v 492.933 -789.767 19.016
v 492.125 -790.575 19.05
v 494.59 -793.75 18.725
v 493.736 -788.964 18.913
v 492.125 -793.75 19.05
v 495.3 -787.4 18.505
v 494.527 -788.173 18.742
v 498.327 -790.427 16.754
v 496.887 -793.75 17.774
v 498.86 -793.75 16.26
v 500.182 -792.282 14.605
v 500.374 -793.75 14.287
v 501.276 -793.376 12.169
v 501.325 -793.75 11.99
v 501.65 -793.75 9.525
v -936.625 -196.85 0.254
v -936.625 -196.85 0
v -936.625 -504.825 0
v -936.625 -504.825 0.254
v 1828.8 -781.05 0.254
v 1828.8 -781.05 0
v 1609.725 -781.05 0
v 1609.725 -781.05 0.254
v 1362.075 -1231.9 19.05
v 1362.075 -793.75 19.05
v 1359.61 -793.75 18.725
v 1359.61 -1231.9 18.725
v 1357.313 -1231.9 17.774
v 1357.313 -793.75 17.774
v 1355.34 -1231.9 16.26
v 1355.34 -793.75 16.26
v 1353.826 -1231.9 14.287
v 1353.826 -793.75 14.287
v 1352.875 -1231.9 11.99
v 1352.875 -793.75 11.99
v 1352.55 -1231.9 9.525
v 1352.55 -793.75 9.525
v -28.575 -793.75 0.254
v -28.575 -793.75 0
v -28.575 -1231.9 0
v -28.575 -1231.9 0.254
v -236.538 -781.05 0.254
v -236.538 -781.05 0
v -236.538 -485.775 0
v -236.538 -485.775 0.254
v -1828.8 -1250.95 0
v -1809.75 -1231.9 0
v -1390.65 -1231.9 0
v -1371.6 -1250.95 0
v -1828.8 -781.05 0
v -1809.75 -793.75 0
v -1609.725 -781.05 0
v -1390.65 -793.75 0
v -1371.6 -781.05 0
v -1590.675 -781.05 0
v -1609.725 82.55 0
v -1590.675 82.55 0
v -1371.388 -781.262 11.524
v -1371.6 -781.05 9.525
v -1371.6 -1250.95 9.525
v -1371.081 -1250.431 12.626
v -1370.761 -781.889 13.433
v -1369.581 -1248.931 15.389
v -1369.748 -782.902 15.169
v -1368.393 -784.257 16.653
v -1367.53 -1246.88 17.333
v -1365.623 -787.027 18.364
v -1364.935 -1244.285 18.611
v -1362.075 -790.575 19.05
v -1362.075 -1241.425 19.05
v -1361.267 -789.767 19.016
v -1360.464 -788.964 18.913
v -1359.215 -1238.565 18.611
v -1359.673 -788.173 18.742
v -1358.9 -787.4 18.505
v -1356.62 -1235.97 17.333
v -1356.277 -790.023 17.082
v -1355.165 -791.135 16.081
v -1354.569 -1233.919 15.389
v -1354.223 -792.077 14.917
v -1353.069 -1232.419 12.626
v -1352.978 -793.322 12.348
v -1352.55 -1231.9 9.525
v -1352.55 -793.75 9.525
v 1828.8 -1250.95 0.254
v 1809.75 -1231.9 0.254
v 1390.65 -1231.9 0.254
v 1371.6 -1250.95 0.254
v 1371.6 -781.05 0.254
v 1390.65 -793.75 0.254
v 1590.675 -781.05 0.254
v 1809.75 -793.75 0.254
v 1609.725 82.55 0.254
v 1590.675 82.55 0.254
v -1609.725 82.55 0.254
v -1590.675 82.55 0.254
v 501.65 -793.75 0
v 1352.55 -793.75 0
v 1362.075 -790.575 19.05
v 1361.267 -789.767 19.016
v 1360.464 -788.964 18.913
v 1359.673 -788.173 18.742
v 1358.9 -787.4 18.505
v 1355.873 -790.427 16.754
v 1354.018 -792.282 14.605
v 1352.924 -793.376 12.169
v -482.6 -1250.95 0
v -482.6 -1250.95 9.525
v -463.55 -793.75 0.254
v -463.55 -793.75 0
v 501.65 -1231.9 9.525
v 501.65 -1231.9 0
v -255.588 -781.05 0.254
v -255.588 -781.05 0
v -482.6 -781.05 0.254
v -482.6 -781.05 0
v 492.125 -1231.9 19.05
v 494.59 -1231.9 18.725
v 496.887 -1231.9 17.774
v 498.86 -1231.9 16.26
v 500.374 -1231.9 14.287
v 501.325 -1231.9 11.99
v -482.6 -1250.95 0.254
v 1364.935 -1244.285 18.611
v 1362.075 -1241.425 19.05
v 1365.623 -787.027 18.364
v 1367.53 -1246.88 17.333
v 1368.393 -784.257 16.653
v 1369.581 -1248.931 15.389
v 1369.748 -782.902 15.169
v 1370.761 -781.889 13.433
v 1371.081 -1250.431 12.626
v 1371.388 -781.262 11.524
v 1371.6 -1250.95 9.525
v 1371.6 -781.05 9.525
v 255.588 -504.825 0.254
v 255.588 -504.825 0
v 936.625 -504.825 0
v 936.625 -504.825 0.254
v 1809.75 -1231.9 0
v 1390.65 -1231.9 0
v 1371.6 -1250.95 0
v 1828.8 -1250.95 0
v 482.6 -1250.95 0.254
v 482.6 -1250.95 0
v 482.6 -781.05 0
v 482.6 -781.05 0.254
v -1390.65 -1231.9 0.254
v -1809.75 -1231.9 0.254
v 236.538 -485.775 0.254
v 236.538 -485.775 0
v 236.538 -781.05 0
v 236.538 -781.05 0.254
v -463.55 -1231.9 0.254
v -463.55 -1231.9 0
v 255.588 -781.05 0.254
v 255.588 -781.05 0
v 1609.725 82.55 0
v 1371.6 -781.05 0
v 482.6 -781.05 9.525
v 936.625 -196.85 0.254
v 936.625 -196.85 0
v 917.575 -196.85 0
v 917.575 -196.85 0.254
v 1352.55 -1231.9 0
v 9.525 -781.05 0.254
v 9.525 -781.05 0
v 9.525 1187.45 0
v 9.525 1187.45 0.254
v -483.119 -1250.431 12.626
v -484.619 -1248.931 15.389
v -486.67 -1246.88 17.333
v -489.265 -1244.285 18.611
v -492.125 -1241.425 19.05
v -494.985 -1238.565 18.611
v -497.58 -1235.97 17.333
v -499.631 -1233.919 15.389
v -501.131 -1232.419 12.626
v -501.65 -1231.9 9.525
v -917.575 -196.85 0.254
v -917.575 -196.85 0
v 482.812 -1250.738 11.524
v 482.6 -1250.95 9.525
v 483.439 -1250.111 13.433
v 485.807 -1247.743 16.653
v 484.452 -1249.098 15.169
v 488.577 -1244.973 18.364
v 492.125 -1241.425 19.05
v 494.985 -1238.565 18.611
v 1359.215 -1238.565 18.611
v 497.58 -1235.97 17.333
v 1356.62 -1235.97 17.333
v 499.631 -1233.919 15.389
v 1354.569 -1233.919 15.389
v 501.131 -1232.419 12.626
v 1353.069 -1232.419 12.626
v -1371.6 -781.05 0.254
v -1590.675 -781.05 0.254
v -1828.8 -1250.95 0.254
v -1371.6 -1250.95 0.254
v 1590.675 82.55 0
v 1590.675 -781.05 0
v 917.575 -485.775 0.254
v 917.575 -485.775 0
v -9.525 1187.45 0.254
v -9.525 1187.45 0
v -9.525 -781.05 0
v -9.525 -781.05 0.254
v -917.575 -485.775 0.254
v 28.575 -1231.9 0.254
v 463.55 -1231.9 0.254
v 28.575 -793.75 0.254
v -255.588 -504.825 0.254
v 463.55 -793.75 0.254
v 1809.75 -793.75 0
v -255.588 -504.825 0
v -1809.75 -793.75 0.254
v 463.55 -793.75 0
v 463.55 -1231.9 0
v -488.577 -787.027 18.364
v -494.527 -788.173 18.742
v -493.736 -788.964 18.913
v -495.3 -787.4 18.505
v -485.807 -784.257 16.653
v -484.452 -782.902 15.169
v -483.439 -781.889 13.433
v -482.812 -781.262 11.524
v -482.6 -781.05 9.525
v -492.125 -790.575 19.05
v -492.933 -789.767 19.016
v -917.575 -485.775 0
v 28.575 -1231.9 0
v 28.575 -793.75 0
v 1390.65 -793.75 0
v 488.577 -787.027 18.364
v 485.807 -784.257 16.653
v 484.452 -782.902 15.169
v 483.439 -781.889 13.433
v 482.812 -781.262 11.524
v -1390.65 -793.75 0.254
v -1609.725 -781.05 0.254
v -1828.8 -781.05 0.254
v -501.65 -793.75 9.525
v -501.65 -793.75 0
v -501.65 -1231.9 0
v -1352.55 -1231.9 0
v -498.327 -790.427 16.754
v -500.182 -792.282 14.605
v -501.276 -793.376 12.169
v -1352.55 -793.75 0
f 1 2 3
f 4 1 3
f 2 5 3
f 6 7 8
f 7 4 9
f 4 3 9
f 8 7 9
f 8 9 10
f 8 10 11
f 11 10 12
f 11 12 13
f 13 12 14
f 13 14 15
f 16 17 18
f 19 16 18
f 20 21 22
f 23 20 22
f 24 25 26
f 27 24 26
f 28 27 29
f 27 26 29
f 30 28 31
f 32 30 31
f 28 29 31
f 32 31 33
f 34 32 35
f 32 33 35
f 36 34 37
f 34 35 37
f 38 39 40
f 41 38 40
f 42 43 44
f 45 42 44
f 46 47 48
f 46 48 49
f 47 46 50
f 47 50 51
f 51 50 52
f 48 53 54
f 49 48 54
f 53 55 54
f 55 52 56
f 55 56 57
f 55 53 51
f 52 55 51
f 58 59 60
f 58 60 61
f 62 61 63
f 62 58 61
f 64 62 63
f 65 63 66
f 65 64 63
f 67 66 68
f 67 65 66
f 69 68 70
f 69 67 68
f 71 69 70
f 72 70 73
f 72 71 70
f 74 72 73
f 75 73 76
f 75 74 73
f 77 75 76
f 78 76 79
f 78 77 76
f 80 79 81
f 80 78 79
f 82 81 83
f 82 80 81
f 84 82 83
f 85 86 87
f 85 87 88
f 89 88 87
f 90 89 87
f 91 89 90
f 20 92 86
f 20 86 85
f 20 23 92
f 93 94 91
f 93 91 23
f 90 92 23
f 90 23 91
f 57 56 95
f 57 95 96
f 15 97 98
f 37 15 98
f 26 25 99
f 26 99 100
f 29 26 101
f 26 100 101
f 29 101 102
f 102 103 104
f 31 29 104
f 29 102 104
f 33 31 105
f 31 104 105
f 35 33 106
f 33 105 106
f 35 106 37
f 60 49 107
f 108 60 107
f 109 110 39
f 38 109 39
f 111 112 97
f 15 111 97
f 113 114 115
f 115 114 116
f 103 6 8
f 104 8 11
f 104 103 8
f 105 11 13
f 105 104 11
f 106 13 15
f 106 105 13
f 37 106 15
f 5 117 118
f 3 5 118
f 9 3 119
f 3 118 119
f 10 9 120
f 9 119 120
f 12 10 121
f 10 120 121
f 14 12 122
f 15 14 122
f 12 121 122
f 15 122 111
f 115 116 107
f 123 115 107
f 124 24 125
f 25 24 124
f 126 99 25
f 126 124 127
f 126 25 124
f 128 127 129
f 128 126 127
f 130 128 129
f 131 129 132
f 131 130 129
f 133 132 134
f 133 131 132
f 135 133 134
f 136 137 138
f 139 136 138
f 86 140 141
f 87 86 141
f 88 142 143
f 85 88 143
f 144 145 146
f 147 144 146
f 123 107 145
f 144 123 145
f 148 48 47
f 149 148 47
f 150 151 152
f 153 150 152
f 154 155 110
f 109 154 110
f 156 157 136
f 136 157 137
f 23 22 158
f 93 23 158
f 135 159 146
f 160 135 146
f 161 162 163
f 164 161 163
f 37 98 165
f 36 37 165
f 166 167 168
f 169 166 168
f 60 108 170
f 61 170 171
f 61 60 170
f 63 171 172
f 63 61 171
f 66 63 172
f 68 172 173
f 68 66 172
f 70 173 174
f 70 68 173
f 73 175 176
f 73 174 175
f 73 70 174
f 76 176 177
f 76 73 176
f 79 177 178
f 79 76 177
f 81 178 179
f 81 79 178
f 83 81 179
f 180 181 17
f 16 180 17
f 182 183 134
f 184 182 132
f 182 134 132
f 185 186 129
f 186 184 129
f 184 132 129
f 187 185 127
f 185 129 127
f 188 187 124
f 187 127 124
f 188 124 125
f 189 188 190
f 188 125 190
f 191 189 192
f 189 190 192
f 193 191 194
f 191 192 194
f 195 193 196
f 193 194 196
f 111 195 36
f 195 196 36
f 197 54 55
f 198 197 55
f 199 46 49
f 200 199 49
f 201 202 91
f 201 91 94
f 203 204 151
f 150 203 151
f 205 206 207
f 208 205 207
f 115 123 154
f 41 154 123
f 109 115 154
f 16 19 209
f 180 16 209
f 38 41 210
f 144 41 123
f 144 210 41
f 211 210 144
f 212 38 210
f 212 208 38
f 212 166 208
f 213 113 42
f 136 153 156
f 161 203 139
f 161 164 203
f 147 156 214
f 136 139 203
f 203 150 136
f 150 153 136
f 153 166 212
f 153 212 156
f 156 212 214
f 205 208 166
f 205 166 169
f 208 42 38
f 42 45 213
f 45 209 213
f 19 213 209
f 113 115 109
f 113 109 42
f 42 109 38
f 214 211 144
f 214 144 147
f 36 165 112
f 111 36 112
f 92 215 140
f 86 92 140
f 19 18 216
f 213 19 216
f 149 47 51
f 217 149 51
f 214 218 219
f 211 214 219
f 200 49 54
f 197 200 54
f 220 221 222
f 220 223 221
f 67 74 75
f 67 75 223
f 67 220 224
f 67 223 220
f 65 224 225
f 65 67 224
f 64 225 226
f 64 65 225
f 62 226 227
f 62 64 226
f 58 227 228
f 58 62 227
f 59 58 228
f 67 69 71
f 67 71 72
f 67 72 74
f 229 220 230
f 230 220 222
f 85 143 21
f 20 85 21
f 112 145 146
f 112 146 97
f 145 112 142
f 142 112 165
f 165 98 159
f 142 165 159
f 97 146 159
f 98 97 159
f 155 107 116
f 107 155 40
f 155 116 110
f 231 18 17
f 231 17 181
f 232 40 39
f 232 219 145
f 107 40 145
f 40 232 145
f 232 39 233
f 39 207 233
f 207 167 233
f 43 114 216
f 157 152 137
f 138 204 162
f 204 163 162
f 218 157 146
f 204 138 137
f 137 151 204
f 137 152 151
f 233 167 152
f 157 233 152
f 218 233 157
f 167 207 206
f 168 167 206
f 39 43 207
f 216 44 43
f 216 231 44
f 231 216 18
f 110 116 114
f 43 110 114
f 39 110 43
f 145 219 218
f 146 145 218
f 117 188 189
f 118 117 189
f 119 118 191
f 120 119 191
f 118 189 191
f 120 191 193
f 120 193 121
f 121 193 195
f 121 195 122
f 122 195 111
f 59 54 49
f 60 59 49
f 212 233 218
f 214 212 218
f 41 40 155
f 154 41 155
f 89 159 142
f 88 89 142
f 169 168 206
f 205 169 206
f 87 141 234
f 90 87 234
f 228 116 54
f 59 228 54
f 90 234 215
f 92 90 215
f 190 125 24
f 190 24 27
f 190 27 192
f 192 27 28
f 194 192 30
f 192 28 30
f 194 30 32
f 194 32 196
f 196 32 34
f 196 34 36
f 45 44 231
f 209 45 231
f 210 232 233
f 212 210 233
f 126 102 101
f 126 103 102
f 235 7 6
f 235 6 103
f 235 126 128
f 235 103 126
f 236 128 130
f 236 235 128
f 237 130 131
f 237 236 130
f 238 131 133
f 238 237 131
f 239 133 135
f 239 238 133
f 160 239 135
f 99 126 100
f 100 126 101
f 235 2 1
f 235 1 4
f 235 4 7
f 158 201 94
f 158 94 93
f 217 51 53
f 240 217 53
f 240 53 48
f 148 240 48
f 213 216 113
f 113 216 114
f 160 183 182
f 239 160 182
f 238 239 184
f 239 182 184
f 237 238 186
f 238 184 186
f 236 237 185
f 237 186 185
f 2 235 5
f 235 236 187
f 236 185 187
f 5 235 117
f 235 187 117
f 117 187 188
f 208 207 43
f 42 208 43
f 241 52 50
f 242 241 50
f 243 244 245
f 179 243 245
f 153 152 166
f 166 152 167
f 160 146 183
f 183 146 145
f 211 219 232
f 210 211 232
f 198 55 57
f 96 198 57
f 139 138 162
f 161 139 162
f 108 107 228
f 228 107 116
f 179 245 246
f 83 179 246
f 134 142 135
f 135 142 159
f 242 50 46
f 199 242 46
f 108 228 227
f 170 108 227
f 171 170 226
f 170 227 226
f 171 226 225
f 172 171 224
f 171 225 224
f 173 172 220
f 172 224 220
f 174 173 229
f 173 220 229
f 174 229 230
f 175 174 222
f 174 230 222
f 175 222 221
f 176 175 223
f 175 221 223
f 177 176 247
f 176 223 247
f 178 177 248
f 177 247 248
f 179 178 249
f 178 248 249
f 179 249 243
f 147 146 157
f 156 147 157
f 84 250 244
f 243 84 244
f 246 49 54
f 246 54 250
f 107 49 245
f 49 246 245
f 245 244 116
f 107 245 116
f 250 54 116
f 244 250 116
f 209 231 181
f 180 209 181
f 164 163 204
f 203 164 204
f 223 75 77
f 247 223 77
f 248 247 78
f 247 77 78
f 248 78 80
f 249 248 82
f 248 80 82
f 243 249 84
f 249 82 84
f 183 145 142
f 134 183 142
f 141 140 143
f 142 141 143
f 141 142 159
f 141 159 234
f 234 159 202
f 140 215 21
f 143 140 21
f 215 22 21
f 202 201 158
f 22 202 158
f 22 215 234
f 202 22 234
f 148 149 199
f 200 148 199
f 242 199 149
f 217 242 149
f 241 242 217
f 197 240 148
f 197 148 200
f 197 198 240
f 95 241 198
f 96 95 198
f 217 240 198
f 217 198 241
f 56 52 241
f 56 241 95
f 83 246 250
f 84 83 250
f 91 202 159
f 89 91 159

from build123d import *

# Parameters (mm, degrees)
F0_W         = 9.525
F0_H         = 457.2
F1_DEPTH     = 0.254
F0_W_2       = 19.05
F0_H_2       = 863.6
F2_DEPTH     = 19.05
F3_T1_DEPTH  = 936.625
F3_T3_DEPTH  = 517.525
F3_T5_DEPTH  = 850.9
F3_T7_DEPTH  = 438.15
F3_T13_DEPTH = 874.7125
F3_T17_DEPTH = 461.9625
F3_T24_DEPTH = 874.7125
F3_T28_DEPTH = 461.9625
F3_T35_DEPTH = 461.9625
F3_T39_DEPTH = 874.7125
F3_T46_DEPTH = 874.7125
F3_T50_DEPTH = 461.9625
F4_DEPTH     = 0.254
F5_DEPTH     = 19.05
F6_T3_DEPTH  = 517.525
F6_T6_DEPTH  = 936.625
F6_T9_DEPTH  = 517.525
F6_T12_DEPTH = 936.625
F6_T15_DEPTH = 850.9
F6_T18_DEPTH = 438.15
F6_T21_DEPTH = 850.9
F6_T24_DEPTH = 438.15
F6_T28_DEPTH = 874.7125
F6_T32_DEPTH = 461.9625
F6_T38_DEPTH = 874.7125
F6_T42_DEPTH = 461.9625
F6_T48_DEPTH = 461.9625
F6_T52_DEPTH = 874.7125
F6_T58_DEPTH = 874.7125
F6_T62_DEPTH = 461.9625


# Not quite as in the source:
# - a fillet or chamfer that OpenCascade refuses, or shapes differently, is made with other operations: its cross-section is extruded or revolved along the edge and cut away or added
# - a feature names something its author has since deleted; it is built from what else it names


with BuildPart() as f1:
    # F0 (on Top) → F1 (new body)
    with BuildSketch(Plane.XY):
        Polygon((0, -793.75), (0, 1187.45), (-9.525, 1187.45), (-9.525, -781.05), (-9.525, -793.75), align=None)
        with Locations((-4.7625, -1022.35)):
            Rectangle(F0_W, F0_H)
        Polygon((-9.525, -793.75), (-9.525, -781.05), (-28.575, -781.05), (-236.5375, -781.05), (-255.5875, -781.05), (-463.55, -781.05), (-482.6, -781.05), (-482.6, -793.75), (-482.6, -1250.95), (-9.525, -1250.95), align=None)
        Polygon((-28.575, -1231.9), (-463.55, -1231.9), (-463.55, -793.75), (-255.5875, -793.75), (-236.5375, -793.75), (-28.575, -793.75), align=None, mode=Mode.SUBTRACT)
        Polygon((-255.5875, -781.05), (-236.5375, -781.05), (-236.5375, -485.775), (-917.575, -485.775), (-917.575, -196.85), (-936.625, -196.85), (-936.625, -504.825), (-936.3493996177, -504.825), (-917.575, -504.825), (-255.5875, -504.825), align=None)
    extrude(amount=F1_DEPTH)

    # F0 (on Top) → F4 (join)
    with BuildSketch(Plane.XY):
        Polygon((9.525, -781.05), (9.525, -793.75), (9.525, -1250.95), (482.6, -1250.95), (482.6, -793.75), (482.6, -781.05), (463.55, -781.05), (255.5875, -781.05), (236.5375, -781.05), (28.575, -781.05), align=None)
        Polygon((28.575, -793.75), (236.5375, -793.75), (255.5875, -793.75), (463.55, -793.75), (463.55, -1231.9), (28.575, -1231.9), align=None, mode=Mode.SUBTRACT)
        with Locations((4.7625, -1022.35)):
            Rectangle(F0_W, F0_H)
        with Locations((-4.7625, -1022.35)):
            Rectangle(F0_W, F0_H)
        Polygon((0, -793.75), (0, 1187.45), (-9.525, 1187.45), (-9.525, -781.05), (-9.525, -793.75), align=None)
        Polygon((9.525, 1187.45), (0, 1187.45), (0, -793.75), (9.525, -793.75), (9.525, -781.05), align=None)
        Polygon((236.5375, -485.775), (236.5375, -781.05), (255.5875, -781.05), (255.5875, -504.825), (917.575, -504.825), (936.3493996177, -504.825), (936.625, -504.825), (936.625, -196.85), (917.575, -196.85), (917.575, -485.775), align=None)
    extrude(amount=F4_DEPTH)


with BuildPart() as f1b:
    # F0 (on Top) → F1, piece 2 (new body)
    with BuildSketch(Plane.XY):
        Polygon((-1809.75, -781.05), (-1828.8, -781.05), (-1828.8, -1250.95), (-1371.6, -1250.95), (-1371.6, -793.75), (-1371.6, -781.05), (-1390.65, -781.05), (-1590.675, -781.05), (-1609.725, -781.05), align=None)
        Polygon((-1809.75, -1231.9), (-1809.75, -793.75), (-1609.725, -793.75), (-1590.675, -793.75), (-1390.65, -793.75), (-1390.65, -1231.9), align=None, mode=Mode.SUBTRACT)
        with Locations((-1600.2, -349.25)):
            Rectangle(F0_W_2, F0_H_2)
    extrude(amount=F1_DEPTH)


with BuildPart() as f2:
    # F0 (on Top) → F2 (new body)
    with BuildSketch(Plane.XY):
        Polygon((-1371.6, -1250.95), (-482.6, -1250.95), (-482.6, -793.75), (-482.6, -781.05), (-501.65, -781.05), (-1352.55, -781.05), (-1371.6, -781.05), (-1371.6, -793.75), align=None)
        Polygon((-501.65, -1231.9), (-1352.55, -1231.9), (-1352.55, -793.75), (-927.1, -793.75), (-501.65, -793.75), align=None, mode=Mode.SUBTRACT)
    extrude(amount=F2_DEPTH)

    # F3: fillet of radius 9.525 on 8 edges, made by hand

    # F3_s2 → F3_t1 (cut)
    with BuildSketch(Plane.YZ.offset(-1395.4125)):
        with BuildLine():
            ThreePointArc((-1250.95, 9.525), (-1248.1601920908, 16.2601920908), (-1241.425, 19.05))
            Line((-1241.425, 19.05), (-1250.95, 19.05))
            Line((-1250.95, 19.05), (-1250.95, 9.525))
        make_face()
        with BuildLine():
            ThreePointArc((-790.575, 19.05), (-783.8398079092, 16.2601920908), (-781.05, 9.525))
            Line((-781.05, 9.525), (-781.05, 19.05))
            Line((-781.05, 19.05), (-790.575, 19.05))
        make_face()
    extrude(amount=F3_T1_DEPTH, mode=Mode.SUBTRACT)

    # F3_s4 → F3_t3 (cut)
    with BuildSketch(Plane.XZ.offset(757.2375)):
        with BuildLine():
            ThreePointArc((-492.125, 19.05), (-485.3898079092, 16.2601920908), (-482.6, 9.525))
            Line((-482.6, 9.525), (-482.6, 19.05))
            Line((-482.6, 19.05), (-492.125, 19.05))
        make_face()
        with BuildLine():
            ThreePointArc((-1362.075, 19.05), (-1368.8101920908, 16.2601920908), (-1371.6, 9.525))
            Line((-1371.6, 9.525), (-1371.6, 19.05))
            Line((-1371.6, 19.05), (-1362.075, 19.05))
        make_face()
    extrude(amount=F3_T3_DEPTH, mode=Mode.SUBTRACT)

    # F3_s6 → F3_t5 (cut)
    with BuildSketch(Plane.YZ.offset(-1352.55)):
        with BuildLine():
            ThreePointArc((-1241.425, 19.05), (-1234.6898079092, 16.2601920908), (-1231.9, 9.525))
            Line((-1231.9, 9.525), (-1231.9, 19.05))
            Line((-1231.9, 19.05), (-1241.425, 19.05))
        make_face()
        with BuildLine():
            ThreePointArc((-784.225, 19.05), (-790.9601920908, 16.2601920908), (-793.75, 9.525))
            Line((-793.75, 9.525), (-793.75, 19.05))
            Line((-793.75, 19.05), (-784.225, 19.05))
        make_face()
    extrude(amount=F3_T5_DEPTH, mode=Mode.SUBTRACT)

    # F3_s8 → F3_t7 (cut)
    with BuildSketch(Plane.XZ.offset(793.75)):
        with BuildLine():
            ThreePointArc((-1362.075, 19.05), (-1355.3398079092, 16.2601920908), (-1352.55, 9.525))
            Line((-1352.55, 9.525), (-1352.55, 19.05))
            Line((-1352.55, 19.05), (-1362.075, 19.05))
        make_face()
        with BuildLine():
            ThreePointArc((-492.125, 19.05), (-498.8601920908, 16.2601920908), (-501.65, 9.525))
            Line((-501.65, 9.525), (-501.65, 19.05))
            Line((-501.65, 19.05), (-492.125, 19.05))
        make_face()
    extrude(amount=F3_T7_DEPTH, mode=Mode.SUBTRACT)


with BuildPart() as f3_tool11:
    # F3_s12 → F3_t13 (new body)
    with BuildSketch(Plane.YZ.offset(-477.8375)):
        with BuildLine():
            ThreePointArc((-1241.425, 19.05), (-1234.6898079092, 16.2601920908), (-1231.9, 9.525))
            Line((-1231.9, 9.525), (-1231.9, 19.05))
            Line((-1231.9, 19.05), (-1241.425, 19.05))
        make_face()
    extrude(amount=-F3_T13_DEPTH)

    split(bisect_by=Plane.YZ.offset(-501.65), keep=Keep.TOP)


with BuildPart() as f3_tool15:
    # F3_s16 → F3_t17 (new body)
    with BuildSketch(Plane.XZ.offset(793.75)):
        with BuildLine():
            ThreePointArc((-492.125, 19.05), (-498.8601920908, 16.2601920908), (-501.65, 9.525))
            Line((-501.65, 9.525), (-501.65, 19.05))
            Line((-501.65, 19.05), (-492.125, 19.05))
        make_face()
    extrude(amount=F3_T17_DEPTH)

    split(bisect_by=Plane.XZ.offset(1231.9), keep=Keep.TOP)


with BuildPart() as f3_tool11_1:
    add(f3_tool11.part)

    # F3_t19: intersect F3_tool15
    add(f3_tool15.part, mode=Mode.INTERSECT)


with BuildPart() as f2_1:
    add(f2.part)

    # F3_t9: cut F3_tool11
    add(f3_tool11_1.part, mode=Mode.SUBTRACT)


with BuildPart() as f3_tool22:
    # F3_s23 → F3_t24 (new body)
    with BuildSketch(Plane.YZ.offset(-501.65)):
        with BuildLine():
            ThreePointArc((-1241.425, 19.05), (-1234.6898079092, 16.2601920908), (-1231.9, 9.525))
            Line((-1231.9, 9.525), (-1231.9, 19.05))
            Line((-1231.9, 19.05), (-1241.425, 19.05))
        make_face()
    extrude(amount=-F3_T24_DEPTH)

    split(bisect_by=Plane.YZ.offset(-1352.55), keep=Keep.BOTTOM)


with BuildPart() as f3_tool26:
    # F3_s27 → F3_t28 (new body)
    with BuildSketch(Plane.XZ.offset(1255.7125)):
        with BuildLine():
            ThreePointArc((-1362.075, 19.05), (-1355.3398079092, 16.2601920908), (-1352.55, 9.525))
            Line((-1352.55, 9.525), (-1352.55, 19.05))
            Line((-1352.55, 19.05), (-1362.075, 19.05))
        make_face()
    extrude(amount=-F3_T28_DEPTH)

    split(bisect_by=Plane.XZ.offset(1231.9), keep=Keep.TOP)


with BuildPart() as f3_tool22_1:
    add(f3_tool22.part)

    # F3_t30: intersect F3_tool26
    add(f3_tool26.part, mode=Mode.INTERSECT)


with BuildPart() as f2_2:
    add(f2_1.part)

    # F3_t20: cut F3_tool22
    add(f3_tool22_1.part, mode=Mode.SUBTRACT)


with BuildPart() as f3_tool33:
    # F3_s34 → F3_t35 (new body)
    with BuildSketch(Plane.XZ.offset(1231.9)):
        with BuildLine():
            ThreePointArc((-1362.075, 19.05), (-1355.3398079092, 16.2601920908), (-1352.55, 9.525))
            Line((-1352.55, 9.525), (-1352.55, 19.05))
            Line((-1352.55, 19.05), (-1362.075, 19.05))
        make_face()
    extrude(amount=-F3_T35_DEPTH)

    split(bisect_by=Plane.XZ.offset(793.75), keep=Keep.BOTTOM)


with BuildPart() as f3_tool37:
    # F3_s38 → F3_t39 (new body)
    with BuildSketch(Plane.YZ.offset(-501.65)):
        with BuildLine():
            ThreePointArc((-784.225, 19.05), (-790.9601920908, 16.2601920908), (-793.75, 9.525))
            Line((-793.75, 9.525), (-793.75, 19.05))
            Line((-793.75, 19.05), (-784.225, 19.05))
        make_face()
    extrude(amount=-F3_T39_DEPTH)

    split(bisect_by=Plane.YZ.offset(-1352.55), keep=Keep.BOTTOM)


with BuildPart() as f3_tool33_1:
    add(f3_tool33.part)

    # F3_t41: intersect F3_tool37
    add(f3_tool37.part, mode=Mode.INTERSECT)


with BuildPart() as f2_3:
    add(f2_2.part)

    # F3_t31: cut F3_tool33
    add(f3_tool33_1.part, mode=Mode.SUBTRACT)


with BuildPart() as f3_tool44:
    # F3_s45 → F3_t46 (new body)
    with BuildSketch(Plane.YZ.offset(-477.8375)):
        with BuildLine():
            ThreePointArc((-784.225, 19.05), (-790.9601920908, 16.2601920908), (-793.75, 9.525))
            Line((-793.75, 9.525), (-793.75, 19.05))
            Line((-793.75, 19.05), (-784.225, 19.05))
        make_face()
    extrude(amount=-F3_T46_DEPTH)

    split(bisect_by=Plane.YZ.offset(-501.65), keep=Keep.TOP)


with BuildPart() as f3_tool48:
    # F3_s49 → F3_t50 (new body)
    with BuildSketch(Plane.XZ.offset(769.9375)):
        with BuildLine():
            ThreePointArc((-492.125, 19.05), (-498.8601920908, 16.2601920908), (-501.65, 9.525))
            Line((-501.65, 9.525), (-501.65, 19.05))
            Line((-501.65, 19.05), (-492.125, 19.05))
        make_face()
    extrude(amount=F3_T50_DEPTH)

    split(bisect_by=Plane.XZ.offset(793.75), keep=Keep.BOTTOM)


with BuildPart() as f3_tool44_1:
    add(f3_tool44.part)

    # F3_t52: intersect F3_tool48
    add(f3_tool48.part, mode=Mode.INTERSECT)


with BuildPart() as f2_4:
    add(f2_3.part)

    # F3_t42: cut F3_tool44
    add(f3_tool44_1.part, mode=Mode.SUBTRACT)


with BuildPart() as f4:
    # F0 (on Top) → F4, piece 2 (new body)
    with BuildSketch(Plane.XY):
        with Locations((1600.2, -349.25)):
            Rectangle(F0_W_2, F0_H_2)
        Polygon((1828.8, -1250.95), (1828.8, -781.05), (1809.75, -781.05), (1609.725, -781.05), (1590.675, -781.05), (1390.65, -781.05), (1371.6, -781.05), (1371.6, -793.75), (1371.6, -1250.95), align=None)
        Polygon((1590.675, -793.75), (1609.725, -793.75), (1809.75, -793.75), (1809.75, -1231.9), (1390.65, -1231.9), (1390.65, -793.75), align=None, mode=Mode.SUBTRACT)
    extrude(amount=F4_DEPTH)


with BuildPart() as f5:
    # F0 (on Top) → F5 (new body)
    with BuildSketch(Plane.XY):
        Polygon((482.6, -793.75), (482.6, -1250.95), (1371.6, -1250.95), (1371.6, -793.75), (1371.6, -781.05), (1352.55, -781.05), (501.65, -781.05), (482.6, -781.05), align=None)
        Polygon((927.1, -793.75), (1352.55, -793.75), (1352.55, -1231.9), (501.65, -1231.9), (501.65, -793.75), align=None, mode=Mode.SUBTRACT)
    extrude(amount=F5_DEPTH)

    # F6: fillet of radius 9.525 on 8 edges, made by hand


with BuildPart() as f6_tool1:
    # F6_s2 → F6_t3 (new body)
    with BuildSketch(Plane.XZ.offset(1274.7625)):
        with BuildLine():
            ThreePointArc((482.6, 9.525), (485.3898079092, 16.2601920908), (492.125, 19.05))
            Line((492.125, 19.05), (482.6, 19.05))
            Line((482.6, 19.05), (482.6, 9.525))
        make_face()
    extrude(amount=-F6_T3_DEPTH)


with BuildPart() as f6_tool4:
    # F6_s5 → F6_t6 (new body)
    with BuildSketch(Plane.YZ.offset(458.7875)):
        with BuildLine():
            ThreePointArc((-1241.425, 19.05), (-1248.1601920908, 16.2601920908), (-1250.95, 9.525))
            Line((-1250.95, 9.525), (-1250.95, 19.05))
            Line((-1250.95, 19.05), (-1241.425, 19.05))
        make_face()
    extrude(amount=F6_T6_DEPTH)


with BuildPart() as f6_tool7:
    # F6_s8 → F6_t9 (new body)
    with BuildSketch(Plane.XZ.offset(757.2375)):
        with BuildLine():
            ThreePointArc((1362.075, 19.05), (1368.8101920908, 16.2601920908), (1371.6, 9.525))
            Line((1371.6, 9.525), (1371.6, 19.05))
            Line((1371.6, 19.05), (1362.075, 19.05))
        make_face()
    extrude(amount=F6_T9_DEPTH)


with BuildPart() as f6_tool10:
    # F6_s11 → F6_t12 (new body)
    with BuildSketch(Plane.YZ.offset(458.7875)):
        with BuildLine():
            ThreePointArc((-790.575, 19.05), (-783.8398079092, 16.2601920908), (-781.05, 9.525))
            Line((-781.05, 9.525), (-781.05, 19.05))
            Line((-781.05, 19.05), (-790.575, 19.05))
        make_face()
    extrude(amount=F6_T12_DEPTH)


with BuildPart() as f6_tool13:
    # F6_s14 → F6_t15 (new body)
    with BuildSketch(Plane.YZ.offset(1352.55)):
        with BuildLine():
            ThreePointArc((-784.225, 19.05), (-790.9601920908, 16.2601920908), (-793.75, 9.525))
            Line((-793.75, 9.525), (-793.75, 19.05))
            Line((-793.75, 19.05), (-784.225, 19.05))
        make_face()
    extrude(amount=-F6_T15_DEPTH)


with BuildPart() as f6_tool16:
    # F6_s17 → F6_t18 (new body)
    with BuildSketch(Plane.XZ.offset(793.75)):
        with BuildLine():
            ThreePointArc((1362.075, 19.05), (1355.3398079092, 16.2601920908), (1352.55, 9.525))
            Line((1352.55, 9.525), (1352.55, 19.05))
            Line((1352.55, 19.05), (1362.075, 19.05))
        make_face()
    extrude(amount=F6_T18_DEPTH)


with BuildPart() as f6_tool19:
    # F6_s20 → F6_t21 (new body)
    with BuildSketch(Plane.YZ.offset(1352.55)):
        with BuildLine():
            ThreePointArc((-1241.425, 19.05), (-1234.6898079092, 16.2601920908), (-1231.9, 9.525))
            Line((-1231.9, 9.525), (-1231.9, 19.05))
            Line((-1231.9, 19.05), (-1241.425, 19.05))
        make_face()
    extrude(amount=-F6_T21_DEPTH)


with BuildPart() as f6_tool22:
    # F6_s23 → F6_t24 (new body)
    with BuildSketch(Plane.XZ.offset(1231.9)):
        with BuildLine():
            ThreePointArc((492.125, 19.05), (498.8601920908, 16.2601920908), (501.65, 9.525))
            Line((501.65, 9.525), (501.65, 19.05))
            Line((501.65, 19.05), (492.125, 19.05))
        make_face()
    extrude(amount=-F6_T24_DEPTH)


with BuildPart() as f6_tool26:
    # F6_s27 → F6_t28 (new body)
    with BuildSketch(Plane.YZ.offset(1376.3625)):
        with BuildLine():
            ThreePointArc((-784.225, 19.05), (-790.9601920908, 16.2601920908), (-793.75, 9.525))
            Line((-793.75, 9.525), (-793.75, 19.05))
            Line((-793.75, 19.05), (-784.225, 19.05))
        make_face()
    extrude(amount=-F6_T28_DEPTH)

    split(bisect_by=Plane.YZ.offset(1352.55), keep=Keep.TOP)


with BuildPart() as f6_tool30:
    # F6_s31 → F6_t32 (new body)
    with BuildSketch(Plane.XZ.offset(769.9375)):
        with BuildLine():
            ThreePointArc((1362.075, 19.05), (1355.3398079092, 16.2601920908), (1352.55, 9.525))
            Line((1352.55, 9.525), (1352.55, 19.05))
            Line((1352.55, 19.05), (1362.075, 19.05))
        make_face()
    extrude(amount=F6_T32_DEPTH)

    split(bisect_by=Plane.XZ.offset(793.75), keep=Keep.BOTTOM)


with BuildPart() as f6_tool26_1:
    add(f6_tool26.part)

    # F6_t34: intersect F6_tool30
    add(f6_tool30.part, mode=Mode.INTERSECT)


with BuildPart() as f6_tool36:
    # F6_s37 → F6_t38 (new body)
    with BuildSketch(Plane.YZ.offset(1352.55)):
        with BuildLine():
            ThreePointArc((-784.225, 19.05), (-790.9601920908, 16.2601920908), (-793.75, 9.525))
            Line((-793.75, 9.525), (-793.75, 19.05))
            Line((-793.75, 19.05), (-784.225, 19.05))
        make_face()
    extrude(amount=-F6_T38_DEPTH)

    split(bisect_by=Plane.YZ.offset(501.65), keep=Keep.BOTTOM)


with BuildPart() as f6_tool40:
    # F6_s41 → F6_t42 (new body)
    with BuildSketch(Plane.XZ.offset(1231.9)):
        with BuildLine():
            ThreePointArc((492.125, 19.05), (498.8601920908, 16.2601920908), (501.65, 9.525))
            Line((501.65, 9.525), (501.65, 19.05))
            Line((501.65, 19.05), (492.125, 19.05))
        make_face()
    extrude(amount=-F6_T42_DEPTH)

    split(bisect_by=Plane.XZ.offset(793.75), keep=Keep.BOTTOM)


with BuildPart() as f6_tool36_1:
    add(f6_tool36.part)

    # F6_t44: intersect F6_tool40
    add(f6_tool40.part, mode=Mode.INTERSECT)


with BuildPart() as f6_tool46:
    # F6_s47 → F6_t48 (new body)
    with BuildSketch(Plane.XZ.offset(793.75)):
        with BuildLine():
            ThreePointArc((1362.075, 19.05), (1355.3398079092, 16.2601920908), (1352.55, 9.525))
            Line((1352.55, 9.525), (1352.55, 19.05))
            Line((1352.55, 19.05), (1362.075, 19.05))
        make_face()
    extrude(amount=F6_T48_DEPTH)

    split(bisect_by=Plane.XZ.offset(1231.9), keep=Keep.TOP)


with BuildPart() as f6_tool50:
    # F6_s51 → F6_t52 (new body)
    with BuildSketch(Plane.YZ.offset(1376.3625)):
        with BuildLine():
            ThreePointArc((-1241.425, 19.05), (-1234.6898079092, 16.2601920908), (-1231.9, 9.525))
            Line((-1231.9, 9.525), (-1231.9, 19.05))
            Line((-1231.9, 19.05), (-1241.425, 19.05))
        make_face()
    extrude(amount=-F6_T52_DEPTH)

    split(bisect_by=Plane.YZ.offset(1352.55), keep=Keep.TOP)


with BuildPart() as f6_tool46_1:
    add(f6_tool46.part)

    # F6_t54: intersect F6_tool50
    add(f6_tool50.part, mode=Mode.INTERSECT)


with BuildPart() as f6_tool56:
    # F6_s57 → F6_t58 (new body)
    with BuildSketch(Plane.YZ.offset(1352.55)):
        with BuildLine():
            ThreePointArc((-1241.425, 19.05), (-1234.6898079092, 16.2601920908), (-1231.9, 9.525))
            Line((-1231.9, 9.525), (-1231.9, 19.05))
            Line((-1231.9, 19.05), (-1241.425, 19.05))
        make_face()
    extrude(amount=-F6_T58_DEPTH)

    split(bisect_by=Plane.YZ.offset(501.65), keep=Keep.BOTTOM)


with BuildPart() as f6_tool60:
    # F6_s61 → F6_t62 (new body)
    with BuildSketch(Plane.XZ.offset(1255.7125)):
        with BuildLine():
            ThreePointArc((492.125, 19.05), (498.8601920908, 16.2601920908), (501.65, 9.525))
            Line((501.65, 9.525), (501.65, 19.05))
            Line((501.65, 19.05), (492.125, 19.05))
        make_face()
    extrude(amount=-F6_T62_DEPTH)

    split(bisect_by=Plane.XZ.offset(1231.9), keep=Keep.TOP)


with BuildPart() as f6_tool56_1:
    add(f6_tool56.part)

    # F6_t64: intersect F6_tool60
    add(f6_tool60.part, mode=Mode.INTERSECT)


with BuildPart() as f5_1:
    add(f5.part)

    # F6_t65: cut F6_tool1, F6_tool4, F6_tool7, F6_tool10, F6_tool13, F6_tool16, F6_tool19, F6_tool22, F6_tool26, F6_tool36, F6_tool46, F6_tool56
    add([f6_tool1.part, f6_tool4.part, f6_tool7.part, f6_tool10.part, f6_tool13.part, f6_tool16.part, f6_tool19.part, f6_tool22.part, f6_tool26_1.part, f6_tool36_1.part, f6_tool46_1.part, f6_tool56_1.part], mode=Mode.SUBTRACT)


solid = Compound([f1.part, f1b.part, f2_4.part, f4.part, f5_1.part])
